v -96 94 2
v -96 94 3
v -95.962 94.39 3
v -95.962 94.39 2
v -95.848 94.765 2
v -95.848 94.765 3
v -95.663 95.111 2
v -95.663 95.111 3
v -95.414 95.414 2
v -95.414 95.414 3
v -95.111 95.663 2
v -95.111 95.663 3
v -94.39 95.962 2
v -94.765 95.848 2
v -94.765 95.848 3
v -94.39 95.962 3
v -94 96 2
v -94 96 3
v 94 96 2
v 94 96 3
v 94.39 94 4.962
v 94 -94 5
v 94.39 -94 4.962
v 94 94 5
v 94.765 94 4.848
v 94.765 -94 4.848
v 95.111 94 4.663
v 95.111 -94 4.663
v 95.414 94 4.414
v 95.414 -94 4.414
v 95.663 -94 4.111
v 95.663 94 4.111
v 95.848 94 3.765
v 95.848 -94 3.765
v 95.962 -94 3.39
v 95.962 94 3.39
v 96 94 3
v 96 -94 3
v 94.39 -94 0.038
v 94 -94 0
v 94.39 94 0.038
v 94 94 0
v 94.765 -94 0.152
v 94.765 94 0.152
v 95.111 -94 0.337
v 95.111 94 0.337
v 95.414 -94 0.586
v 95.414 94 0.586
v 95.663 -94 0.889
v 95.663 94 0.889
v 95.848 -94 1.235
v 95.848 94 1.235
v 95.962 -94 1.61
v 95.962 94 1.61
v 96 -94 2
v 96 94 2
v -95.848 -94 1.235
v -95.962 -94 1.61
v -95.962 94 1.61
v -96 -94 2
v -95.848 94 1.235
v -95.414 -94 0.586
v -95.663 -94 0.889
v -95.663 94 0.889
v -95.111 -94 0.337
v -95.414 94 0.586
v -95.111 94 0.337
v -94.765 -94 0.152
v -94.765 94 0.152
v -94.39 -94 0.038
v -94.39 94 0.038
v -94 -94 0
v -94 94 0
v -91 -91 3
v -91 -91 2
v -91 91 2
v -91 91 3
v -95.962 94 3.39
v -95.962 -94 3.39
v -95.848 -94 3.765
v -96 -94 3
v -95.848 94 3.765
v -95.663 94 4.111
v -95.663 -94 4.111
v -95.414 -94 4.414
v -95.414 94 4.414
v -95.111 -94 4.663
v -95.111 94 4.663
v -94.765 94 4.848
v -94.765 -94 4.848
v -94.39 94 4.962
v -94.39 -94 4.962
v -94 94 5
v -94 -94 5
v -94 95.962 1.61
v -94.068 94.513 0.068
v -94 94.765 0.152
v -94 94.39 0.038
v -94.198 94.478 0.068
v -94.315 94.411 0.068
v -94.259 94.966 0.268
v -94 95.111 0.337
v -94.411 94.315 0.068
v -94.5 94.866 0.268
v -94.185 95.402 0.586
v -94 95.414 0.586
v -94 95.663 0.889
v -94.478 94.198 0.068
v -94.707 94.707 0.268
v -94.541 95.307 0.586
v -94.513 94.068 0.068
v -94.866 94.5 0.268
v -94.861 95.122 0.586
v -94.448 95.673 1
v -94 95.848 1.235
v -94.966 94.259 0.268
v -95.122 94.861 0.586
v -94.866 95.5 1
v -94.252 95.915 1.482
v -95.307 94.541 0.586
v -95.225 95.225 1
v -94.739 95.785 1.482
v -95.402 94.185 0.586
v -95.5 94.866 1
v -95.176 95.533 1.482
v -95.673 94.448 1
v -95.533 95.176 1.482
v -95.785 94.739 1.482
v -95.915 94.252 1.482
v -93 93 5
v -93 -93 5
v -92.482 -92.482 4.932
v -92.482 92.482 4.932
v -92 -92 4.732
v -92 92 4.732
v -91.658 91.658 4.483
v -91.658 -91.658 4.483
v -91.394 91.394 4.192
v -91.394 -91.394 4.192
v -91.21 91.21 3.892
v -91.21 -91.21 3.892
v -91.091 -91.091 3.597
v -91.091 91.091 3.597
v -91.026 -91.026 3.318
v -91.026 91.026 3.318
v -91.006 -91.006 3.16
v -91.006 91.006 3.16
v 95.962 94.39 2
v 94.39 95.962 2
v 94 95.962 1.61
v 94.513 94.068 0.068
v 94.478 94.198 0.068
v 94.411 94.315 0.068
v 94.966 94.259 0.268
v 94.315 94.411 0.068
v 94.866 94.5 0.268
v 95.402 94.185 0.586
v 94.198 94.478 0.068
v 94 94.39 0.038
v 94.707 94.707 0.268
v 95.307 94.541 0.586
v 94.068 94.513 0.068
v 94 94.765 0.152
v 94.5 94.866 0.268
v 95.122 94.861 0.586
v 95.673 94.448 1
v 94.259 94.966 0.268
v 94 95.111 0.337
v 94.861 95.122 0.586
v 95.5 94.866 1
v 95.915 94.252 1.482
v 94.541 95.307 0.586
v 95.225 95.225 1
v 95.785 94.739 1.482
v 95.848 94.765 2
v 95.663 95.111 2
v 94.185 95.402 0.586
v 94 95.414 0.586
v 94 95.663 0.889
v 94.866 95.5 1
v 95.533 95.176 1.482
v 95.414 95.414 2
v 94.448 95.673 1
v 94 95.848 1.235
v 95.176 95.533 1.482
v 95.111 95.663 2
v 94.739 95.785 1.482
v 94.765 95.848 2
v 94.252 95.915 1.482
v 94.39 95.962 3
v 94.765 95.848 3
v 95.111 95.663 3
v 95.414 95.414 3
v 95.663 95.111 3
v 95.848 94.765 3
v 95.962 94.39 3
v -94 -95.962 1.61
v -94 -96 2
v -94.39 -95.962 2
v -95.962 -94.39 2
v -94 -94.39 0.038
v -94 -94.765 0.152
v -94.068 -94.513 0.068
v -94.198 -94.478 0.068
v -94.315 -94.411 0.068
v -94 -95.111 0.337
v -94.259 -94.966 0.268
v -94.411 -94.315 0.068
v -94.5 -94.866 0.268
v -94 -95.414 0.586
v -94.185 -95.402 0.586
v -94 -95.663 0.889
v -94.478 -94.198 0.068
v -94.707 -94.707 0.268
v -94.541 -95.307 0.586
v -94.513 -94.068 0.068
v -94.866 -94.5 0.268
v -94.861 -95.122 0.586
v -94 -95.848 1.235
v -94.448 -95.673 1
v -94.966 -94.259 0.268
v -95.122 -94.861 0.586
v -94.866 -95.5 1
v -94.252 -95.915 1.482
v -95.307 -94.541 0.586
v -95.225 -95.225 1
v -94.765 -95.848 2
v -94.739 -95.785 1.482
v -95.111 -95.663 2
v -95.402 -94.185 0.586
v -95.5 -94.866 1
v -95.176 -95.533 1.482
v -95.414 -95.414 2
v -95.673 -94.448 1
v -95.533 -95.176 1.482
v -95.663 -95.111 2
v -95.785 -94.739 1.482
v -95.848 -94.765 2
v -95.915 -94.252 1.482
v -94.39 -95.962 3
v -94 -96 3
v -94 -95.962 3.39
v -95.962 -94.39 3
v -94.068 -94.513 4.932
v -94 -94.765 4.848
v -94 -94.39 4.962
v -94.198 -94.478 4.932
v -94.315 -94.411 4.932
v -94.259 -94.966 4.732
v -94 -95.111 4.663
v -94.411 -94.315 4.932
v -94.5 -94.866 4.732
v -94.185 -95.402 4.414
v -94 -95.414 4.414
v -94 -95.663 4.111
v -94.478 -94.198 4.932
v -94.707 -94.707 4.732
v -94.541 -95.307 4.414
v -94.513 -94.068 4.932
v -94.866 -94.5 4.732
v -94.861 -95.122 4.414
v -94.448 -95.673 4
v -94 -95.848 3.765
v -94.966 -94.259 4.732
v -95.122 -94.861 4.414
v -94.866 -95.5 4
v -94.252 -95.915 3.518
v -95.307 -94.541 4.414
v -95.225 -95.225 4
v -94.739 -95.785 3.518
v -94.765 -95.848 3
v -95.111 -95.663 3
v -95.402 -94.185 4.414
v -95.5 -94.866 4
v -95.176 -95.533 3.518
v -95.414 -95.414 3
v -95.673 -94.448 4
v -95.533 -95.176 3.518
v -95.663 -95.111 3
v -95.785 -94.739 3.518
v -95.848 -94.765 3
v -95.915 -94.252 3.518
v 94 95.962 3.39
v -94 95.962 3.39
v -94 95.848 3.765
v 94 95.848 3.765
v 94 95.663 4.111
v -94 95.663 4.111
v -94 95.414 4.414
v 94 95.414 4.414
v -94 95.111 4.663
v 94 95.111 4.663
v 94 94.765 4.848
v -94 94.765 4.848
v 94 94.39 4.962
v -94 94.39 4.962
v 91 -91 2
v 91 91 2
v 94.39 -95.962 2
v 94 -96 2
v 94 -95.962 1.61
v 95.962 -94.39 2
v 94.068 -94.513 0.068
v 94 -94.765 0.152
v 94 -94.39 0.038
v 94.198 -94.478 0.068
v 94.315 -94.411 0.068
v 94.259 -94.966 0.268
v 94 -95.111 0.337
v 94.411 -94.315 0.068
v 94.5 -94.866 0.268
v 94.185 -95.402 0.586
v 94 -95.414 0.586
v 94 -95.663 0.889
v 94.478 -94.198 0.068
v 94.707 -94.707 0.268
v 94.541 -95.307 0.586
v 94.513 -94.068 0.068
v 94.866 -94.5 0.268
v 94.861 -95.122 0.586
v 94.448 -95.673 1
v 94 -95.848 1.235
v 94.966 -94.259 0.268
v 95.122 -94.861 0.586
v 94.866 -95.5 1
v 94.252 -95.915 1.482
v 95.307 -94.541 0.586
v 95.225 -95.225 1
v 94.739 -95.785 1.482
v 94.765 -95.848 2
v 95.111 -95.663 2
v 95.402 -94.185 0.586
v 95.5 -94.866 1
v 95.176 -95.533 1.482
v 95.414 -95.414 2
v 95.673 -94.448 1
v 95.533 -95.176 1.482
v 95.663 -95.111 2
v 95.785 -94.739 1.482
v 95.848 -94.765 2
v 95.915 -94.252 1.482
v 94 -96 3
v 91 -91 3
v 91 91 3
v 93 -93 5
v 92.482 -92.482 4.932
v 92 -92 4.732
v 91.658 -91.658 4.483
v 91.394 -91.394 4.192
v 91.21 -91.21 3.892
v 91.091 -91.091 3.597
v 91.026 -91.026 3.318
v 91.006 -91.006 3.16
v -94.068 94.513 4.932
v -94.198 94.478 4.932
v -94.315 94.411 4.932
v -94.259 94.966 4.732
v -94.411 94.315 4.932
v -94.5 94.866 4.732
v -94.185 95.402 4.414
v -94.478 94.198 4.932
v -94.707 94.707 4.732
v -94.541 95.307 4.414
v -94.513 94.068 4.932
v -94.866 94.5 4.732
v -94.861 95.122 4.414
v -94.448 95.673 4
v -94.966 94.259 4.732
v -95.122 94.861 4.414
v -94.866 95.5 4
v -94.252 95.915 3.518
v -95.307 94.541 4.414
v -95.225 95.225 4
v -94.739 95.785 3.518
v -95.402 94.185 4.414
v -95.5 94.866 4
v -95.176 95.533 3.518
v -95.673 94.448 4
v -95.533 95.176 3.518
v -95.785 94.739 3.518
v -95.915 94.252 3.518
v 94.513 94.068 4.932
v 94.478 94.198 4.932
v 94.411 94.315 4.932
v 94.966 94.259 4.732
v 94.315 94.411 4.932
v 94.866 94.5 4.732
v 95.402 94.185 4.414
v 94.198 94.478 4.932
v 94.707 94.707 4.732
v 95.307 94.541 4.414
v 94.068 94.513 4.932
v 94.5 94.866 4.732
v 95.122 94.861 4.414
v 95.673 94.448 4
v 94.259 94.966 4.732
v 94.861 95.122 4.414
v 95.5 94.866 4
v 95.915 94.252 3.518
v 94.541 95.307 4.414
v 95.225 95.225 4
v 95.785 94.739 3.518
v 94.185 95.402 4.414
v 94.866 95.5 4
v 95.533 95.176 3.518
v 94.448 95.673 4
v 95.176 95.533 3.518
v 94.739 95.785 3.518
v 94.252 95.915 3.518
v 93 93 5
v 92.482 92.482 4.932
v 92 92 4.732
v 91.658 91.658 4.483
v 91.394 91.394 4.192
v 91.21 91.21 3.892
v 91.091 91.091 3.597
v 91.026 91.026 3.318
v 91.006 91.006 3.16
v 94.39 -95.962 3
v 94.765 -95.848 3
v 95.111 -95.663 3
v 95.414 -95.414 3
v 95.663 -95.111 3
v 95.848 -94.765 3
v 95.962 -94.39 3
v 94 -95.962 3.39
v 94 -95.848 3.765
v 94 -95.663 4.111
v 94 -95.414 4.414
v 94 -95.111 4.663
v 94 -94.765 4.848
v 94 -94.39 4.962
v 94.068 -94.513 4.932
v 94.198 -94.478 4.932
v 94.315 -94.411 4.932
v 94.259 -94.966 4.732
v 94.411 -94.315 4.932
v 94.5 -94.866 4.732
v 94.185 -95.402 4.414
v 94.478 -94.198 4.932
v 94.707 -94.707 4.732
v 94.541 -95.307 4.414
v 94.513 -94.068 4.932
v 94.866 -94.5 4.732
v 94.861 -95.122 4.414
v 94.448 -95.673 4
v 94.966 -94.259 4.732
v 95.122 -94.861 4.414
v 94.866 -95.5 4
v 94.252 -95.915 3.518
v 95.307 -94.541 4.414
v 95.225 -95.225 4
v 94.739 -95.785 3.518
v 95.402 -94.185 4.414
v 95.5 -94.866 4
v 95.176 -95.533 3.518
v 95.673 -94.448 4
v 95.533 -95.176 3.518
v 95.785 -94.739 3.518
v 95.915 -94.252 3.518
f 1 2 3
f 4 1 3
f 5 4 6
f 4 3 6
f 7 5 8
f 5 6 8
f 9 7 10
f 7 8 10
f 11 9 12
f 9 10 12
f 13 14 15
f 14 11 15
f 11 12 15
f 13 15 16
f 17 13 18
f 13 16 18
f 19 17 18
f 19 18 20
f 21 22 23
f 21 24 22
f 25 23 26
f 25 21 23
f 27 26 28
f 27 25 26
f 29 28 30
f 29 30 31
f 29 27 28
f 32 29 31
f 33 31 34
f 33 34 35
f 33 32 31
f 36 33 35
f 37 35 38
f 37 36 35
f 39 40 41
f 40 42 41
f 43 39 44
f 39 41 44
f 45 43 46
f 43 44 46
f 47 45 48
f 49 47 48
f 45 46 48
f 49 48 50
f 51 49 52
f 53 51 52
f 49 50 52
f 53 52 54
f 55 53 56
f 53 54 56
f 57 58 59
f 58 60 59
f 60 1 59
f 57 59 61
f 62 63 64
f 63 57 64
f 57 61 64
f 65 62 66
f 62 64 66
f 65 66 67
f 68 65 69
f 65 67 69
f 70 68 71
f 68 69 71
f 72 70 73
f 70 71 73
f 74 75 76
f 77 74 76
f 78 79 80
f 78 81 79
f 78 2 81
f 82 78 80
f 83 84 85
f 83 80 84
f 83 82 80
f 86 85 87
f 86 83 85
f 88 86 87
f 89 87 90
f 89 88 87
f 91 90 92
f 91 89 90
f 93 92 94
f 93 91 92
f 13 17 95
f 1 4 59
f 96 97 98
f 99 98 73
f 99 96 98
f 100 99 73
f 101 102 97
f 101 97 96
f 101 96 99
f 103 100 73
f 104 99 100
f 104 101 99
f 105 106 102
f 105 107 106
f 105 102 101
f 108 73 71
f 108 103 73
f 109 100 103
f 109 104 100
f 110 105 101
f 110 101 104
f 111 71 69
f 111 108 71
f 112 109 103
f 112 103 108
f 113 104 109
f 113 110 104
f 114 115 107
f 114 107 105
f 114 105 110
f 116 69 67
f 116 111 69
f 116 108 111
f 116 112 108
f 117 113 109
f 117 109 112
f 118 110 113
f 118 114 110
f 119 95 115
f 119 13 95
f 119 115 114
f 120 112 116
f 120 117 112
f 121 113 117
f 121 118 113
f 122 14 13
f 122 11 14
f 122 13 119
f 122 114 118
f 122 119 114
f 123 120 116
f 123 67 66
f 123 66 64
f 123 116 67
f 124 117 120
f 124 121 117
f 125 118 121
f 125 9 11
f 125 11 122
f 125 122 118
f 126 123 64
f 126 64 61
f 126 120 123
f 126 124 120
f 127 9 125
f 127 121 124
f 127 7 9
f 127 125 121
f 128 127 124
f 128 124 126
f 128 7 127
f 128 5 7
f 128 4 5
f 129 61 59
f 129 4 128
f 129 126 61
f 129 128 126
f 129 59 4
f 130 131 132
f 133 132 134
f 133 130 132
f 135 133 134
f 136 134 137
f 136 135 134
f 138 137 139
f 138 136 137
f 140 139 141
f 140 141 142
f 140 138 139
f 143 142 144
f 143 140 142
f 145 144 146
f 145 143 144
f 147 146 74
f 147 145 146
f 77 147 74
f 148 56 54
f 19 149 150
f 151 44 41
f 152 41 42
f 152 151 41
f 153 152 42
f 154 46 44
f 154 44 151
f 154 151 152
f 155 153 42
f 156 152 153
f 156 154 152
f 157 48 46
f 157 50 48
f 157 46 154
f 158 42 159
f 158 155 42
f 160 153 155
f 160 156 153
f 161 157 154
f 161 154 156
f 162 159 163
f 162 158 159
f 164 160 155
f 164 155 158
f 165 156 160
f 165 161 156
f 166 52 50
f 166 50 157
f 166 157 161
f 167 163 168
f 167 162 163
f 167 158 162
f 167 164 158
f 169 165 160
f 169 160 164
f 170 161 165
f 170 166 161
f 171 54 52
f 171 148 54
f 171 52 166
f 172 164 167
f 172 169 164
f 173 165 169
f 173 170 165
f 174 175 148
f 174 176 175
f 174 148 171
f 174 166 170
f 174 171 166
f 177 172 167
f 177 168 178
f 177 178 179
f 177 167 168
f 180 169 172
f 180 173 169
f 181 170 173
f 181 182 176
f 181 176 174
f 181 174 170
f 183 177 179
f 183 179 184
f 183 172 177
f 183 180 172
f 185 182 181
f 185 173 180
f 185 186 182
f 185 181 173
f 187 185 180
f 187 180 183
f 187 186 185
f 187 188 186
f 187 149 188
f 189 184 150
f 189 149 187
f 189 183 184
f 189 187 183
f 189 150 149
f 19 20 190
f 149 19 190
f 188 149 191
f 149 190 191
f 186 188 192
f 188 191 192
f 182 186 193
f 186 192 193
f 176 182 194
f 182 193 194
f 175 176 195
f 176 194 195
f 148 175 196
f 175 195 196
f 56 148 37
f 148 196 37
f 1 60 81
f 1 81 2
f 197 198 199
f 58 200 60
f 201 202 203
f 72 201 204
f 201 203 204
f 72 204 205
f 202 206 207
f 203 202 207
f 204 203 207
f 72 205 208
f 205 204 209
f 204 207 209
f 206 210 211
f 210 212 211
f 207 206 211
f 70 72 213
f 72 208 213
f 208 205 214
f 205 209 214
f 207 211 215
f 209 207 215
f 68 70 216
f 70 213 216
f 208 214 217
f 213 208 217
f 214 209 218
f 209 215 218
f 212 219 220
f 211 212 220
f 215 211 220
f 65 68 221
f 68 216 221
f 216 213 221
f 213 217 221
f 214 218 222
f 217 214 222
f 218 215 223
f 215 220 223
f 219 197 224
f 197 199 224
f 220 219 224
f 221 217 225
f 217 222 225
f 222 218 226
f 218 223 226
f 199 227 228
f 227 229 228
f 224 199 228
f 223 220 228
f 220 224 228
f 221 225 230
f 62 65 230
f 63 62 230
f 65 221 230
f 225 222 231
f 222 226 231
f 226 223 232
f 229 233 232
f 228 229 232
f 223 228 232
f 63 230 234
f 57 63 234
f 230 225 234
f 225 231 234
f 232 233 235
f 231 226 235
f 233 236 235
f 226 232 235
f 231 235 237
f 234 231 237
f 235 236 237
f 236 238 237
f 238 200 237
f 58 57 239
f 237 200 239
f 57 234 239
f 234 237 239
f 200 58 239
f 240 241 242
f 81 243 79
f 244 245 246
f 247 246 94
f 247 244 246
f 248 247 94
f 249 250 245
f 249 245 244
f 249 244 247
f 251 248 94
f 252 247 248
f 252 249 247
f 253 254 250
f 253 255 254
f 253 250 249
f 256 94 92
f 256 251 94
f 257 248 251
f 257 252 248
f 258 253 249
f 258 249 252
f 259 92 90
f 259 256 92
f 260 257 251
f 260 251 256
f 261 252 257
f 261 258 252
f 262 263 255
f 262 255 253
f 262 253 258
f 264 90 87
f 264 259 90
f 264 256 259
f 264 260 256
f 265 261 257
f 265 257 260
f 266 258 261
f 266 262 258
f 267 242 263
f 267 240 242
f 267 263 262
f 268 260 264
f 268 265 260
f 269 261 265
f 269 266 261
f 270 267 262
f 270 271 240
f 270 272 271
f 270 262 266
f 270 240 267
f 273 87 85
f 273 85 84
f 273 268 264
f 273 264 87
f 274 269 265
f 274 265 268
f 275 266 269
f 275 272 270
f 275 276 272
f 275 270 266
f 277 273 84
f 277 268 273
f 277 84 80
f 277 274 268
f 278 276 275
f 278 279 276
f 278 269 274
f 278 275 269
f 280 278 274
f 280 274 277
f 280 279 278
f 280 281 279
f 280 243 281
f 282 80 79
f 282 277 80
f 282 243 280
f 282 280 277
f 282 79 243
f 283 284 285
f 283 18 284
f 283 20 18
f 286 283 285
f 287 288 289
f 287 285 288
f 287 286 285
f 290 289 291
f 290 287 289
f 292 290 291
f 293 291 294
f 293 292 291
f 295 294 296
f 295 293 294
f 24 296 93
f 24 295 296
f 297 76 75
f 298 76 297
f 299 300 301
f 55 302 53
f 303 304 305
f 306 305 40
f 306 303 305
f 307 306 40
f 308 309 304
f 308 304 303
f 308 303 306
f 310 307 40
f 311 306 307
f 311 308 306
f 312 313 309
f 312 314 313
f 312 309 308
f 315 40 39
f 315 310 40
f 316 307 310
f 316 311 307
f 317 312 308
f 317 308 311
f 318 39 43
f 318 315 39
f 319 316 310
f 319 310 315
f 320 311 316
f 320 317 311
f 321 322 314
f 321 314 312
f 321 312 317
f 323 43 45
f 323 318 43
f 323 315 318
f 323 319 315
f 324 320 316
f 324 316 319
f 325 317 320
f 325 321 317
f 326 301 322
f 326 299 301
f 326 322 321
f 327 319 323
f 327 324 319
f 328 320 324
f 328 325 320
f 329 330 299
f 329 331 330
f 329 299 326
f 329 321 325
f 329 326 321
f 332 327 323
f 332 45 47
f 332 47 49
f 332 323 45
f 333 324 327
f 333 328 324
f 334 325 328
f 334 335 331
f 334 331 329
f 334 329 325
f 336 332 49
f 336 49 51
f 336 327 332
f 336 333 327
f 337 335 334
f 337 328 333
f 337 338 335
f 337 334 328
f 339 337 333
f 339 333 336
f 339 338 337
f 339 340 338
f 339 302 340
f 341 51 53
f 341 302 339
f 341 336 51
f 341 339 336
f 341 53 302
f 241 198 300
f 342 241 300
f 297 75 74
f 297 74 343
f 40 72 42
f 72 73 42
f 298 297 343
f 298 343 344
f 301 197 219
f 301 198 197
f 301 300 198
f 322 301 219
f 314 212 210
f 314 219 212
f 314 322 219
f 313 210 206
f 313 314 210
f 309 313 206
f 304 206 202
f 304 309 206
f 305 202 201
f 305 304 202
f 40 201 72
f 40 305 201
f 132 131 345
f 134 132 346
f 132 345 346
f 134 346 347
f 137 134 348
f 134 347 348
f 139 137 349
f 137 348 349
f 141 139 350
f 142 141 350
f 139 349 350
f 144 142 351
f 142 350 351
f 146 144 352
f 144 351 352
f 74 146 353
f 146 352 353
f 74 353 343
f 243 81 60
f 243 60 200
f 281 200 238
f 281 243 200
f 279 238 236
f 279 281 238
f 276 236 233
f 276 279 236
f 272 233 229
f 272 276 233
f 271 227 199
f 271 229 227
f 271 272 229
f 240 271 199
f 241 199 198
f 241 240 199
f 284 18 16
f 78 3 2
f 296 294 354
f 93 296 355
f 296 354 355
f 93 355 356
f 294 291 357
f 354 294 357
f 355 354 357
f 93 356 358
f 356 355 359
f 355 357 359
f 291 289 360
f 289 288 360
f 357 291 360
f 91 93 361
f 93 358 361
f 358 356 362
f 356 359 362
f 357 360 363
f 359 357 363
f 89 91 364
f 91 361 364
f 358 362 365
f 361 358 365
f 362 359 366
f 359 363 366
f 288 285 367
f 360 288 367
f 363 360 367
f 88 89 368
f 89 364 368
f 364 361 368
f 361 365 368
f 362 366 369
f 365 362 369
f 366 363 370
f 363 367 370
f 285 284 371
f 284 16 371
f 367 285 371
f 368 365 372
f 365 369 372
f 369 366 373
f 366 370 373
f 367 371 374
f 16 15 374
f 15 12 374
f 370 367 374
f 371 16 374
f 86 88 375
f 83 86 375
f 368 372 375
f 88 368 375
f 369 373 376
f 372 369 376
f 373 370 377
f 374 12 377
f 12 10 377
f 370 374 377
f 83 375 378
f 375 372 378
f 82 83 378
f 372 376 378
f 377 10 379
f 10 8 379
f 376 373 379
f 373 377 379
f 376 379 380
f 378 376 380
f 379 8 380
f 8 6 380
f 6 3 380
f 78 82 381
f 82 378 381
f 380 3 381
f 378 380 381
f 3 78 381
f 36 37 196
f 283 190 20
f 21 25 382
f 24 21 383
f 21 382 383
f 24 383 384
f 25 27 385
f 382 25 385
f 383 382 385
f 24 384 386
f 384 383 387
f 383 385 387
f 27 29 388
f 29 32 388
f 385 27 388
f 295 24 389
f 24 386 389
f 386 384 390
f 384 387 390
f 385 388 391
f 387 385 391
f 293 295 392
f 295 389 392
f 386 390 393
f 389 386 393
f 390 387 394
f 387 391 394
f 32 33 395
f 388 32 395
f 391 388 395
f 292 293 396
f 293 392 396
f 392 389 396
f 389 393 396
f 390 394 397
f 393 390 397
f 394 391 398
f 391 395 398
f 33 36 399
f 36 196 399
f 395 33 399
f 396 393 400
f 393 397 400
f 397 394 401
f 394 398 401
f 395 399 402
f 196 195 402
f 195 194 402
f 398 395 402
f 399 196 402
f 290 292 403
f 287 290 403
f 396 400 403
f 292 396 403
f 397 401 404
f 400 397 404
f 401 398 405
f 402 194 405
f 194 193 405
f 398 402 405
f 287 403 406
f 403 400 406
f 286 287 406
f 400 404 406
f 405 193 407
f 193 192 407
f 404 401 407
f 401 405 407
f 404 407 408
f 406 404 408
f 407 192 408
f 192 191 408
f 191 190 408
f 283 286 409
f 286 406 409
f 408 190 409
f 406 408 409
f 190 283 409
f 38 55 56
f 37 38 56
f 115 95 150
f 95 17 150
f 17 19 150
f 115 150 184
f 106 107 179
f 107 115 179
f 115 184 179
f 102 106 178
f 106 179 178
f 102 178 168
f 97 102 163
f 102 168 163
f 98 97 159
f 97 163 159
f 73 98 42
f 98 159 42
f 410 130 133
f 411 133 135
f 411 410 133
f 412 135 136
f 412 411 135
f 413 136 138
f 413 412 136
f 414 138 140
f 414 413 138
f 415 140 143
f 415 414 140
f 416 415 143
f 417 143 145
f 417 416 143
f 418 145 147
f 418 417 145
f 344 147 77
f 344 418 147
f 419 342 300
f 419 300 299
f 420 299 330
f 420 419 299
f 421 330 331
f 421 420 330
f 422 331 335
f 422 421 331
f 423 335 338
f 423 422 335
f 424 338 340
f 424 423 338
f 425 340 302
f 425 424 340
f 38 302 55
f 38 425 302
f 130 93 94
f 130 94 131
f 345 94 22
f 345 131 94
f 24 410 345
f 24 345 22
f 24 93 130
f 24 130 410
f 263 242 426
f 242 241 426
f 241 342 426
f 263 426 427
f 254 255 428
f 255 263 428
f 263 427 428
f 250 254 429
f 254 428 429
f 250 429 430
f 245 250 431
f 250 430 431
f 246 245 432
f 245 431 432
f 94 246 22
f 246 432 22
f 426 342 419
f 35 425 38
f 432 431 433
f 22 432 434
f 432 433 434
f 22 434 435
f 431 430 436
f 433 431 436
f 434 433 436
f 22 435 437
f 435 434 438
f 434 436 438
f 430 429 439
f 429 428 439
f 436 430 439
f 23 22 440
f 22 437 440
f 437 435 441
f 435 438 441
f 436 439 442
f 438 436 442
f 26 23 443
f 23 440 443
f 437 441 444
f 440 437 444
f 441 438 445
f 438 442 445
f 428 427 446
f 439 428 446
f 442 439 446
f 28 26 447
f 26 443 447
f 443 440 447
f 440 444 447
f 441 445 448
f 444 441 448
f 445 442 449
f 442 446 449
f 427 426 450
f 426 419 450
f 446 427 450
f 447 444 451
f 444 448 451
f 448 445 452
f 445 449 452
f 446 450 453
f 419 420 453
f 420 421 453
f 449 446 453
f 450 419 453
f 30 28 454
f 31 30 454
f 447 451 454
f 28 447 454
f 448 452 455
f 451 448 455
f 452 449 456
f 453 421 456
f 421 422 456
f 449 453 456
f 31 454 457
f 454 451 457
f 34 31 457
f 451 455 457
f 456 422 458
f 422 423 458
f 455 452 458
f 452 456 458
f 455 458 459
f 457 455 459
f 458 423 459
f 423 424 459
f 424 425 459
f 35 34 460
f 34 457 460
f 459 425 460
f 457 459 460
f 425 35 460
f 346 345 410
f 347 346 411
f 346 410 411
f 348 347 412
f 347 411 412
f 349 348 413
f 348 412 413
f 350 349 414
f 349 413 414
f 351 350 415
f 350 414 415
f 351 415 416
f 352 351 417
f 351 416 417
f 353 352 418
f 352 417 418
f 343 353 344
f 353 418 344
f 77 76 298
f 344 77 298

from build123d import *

# Parameters (mm, degrees)
F0_W     = 182
F0_H     = 182
F1_DEPTH = 2
F0_W_2   = 192
F0_H_2   = 192
F2_DEPTH = 5
F3_R     = 2


with BuildPart() as f1:
    # F0 (on Top) → F1 (new body)
    with BuildSketch(Plane.XY):
        Rectangle(F0_W, F0_H)
    extrude(amount=F1_DEPTH)

    # F0 (on Top) → F2 (join)
    with BuildSketch(Plane.XY):
        Rectangle(F0_W_2, F0_H_2)
        Rectangle(F0_W, F0_H, mode=Mode.SUBTRACT)
    extrude(amount=F2_DEPTH)

    # F3
    f3_edges = [f1.edges().sort_by_distance(p)[0] for p in [
        (-96, -96, 2.5),
        (96, -96, 2.5),
        (0, -96, 0),
        (0, -96, 5),
        (96, 96, 2.5),
        (96, 0, 0),
        (96, 0, 5),
        (-96, 96, 2.5),
        (0, 96, 0),
        (0, 96, 5),
        (-96, 0, 0),
        (-96, 0, 5),
        (0, 91, 5),
        (91, 0, 5),
        (0, -91, 5),
        (-91, 0, 5),
    ]]
    fillet(f3_edges, radius=F3_R)


solid = f1.part
